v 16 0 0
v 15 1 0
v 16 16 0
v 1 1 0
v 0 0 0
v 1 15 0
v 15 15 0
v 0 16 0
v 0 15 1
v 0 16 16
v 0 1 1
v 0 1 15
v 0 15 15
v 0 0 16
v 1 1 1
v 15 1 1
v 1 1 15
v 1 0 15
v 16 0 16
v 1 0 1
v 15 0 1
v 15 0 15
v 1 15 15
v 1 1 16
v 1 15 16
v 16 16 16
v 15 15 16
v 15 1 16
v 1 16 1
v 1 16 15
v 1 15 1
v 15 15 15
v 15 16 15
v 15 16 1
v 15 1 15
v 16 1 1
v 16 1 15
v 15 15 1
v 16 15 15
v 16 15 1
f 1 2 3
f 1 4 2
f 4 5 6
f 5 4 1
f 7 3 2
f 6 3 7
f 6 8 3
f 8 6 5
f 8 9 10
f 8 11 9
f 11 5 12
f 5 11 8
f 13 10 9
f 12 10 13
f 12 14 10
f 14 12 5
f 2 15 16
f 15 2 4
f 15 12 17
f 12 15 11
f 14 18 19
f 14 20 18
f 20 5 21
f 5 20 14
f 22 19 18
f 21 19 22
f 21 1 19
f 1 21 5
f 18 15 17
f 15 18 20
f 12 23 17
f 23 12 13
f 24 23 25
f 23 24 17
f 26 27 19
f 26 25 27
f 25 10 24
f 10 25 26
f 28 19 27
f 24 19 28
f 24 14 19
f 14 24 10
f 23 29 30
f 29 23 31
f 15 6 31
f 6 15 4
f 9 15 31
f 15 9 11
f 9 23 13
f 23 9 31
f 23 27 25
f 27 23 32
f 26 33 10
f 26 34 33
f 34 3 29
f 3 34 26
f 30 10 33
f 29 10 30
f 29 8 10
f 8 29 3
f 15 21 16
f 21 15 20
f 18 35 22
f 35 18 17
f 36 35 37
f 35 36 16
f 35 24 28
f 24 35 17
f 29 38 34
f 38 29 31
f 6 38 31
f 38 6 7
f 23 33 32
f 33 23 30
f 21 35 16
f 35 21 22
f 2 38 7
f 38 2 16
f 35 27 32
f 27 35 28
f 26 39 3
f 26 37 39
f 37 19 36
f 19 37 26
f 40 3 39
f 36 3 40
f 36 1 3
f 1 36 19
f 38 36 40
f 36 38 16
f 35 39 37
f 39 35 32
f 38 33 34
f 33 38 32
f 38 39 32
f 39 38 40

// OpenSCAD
union() {
    translate([0.0, 0.0, 0.0]) cube([1, 1, 1]);
    translate([0.0, 0.0, 1.0]) cube([1, 1, 1]);
    translate([0.0, 0.0, 2.0]) cube([1, 1, 1]);
    translate([0.0, 0.0, 3.0]) cube([1, 1, 1]);
    translate([0.0, 0.0, 4.0]) cube([1, 1, 1]);
    translate([0.0, 0.0, 5.0]) cube([1, 1, 1]);
    translate([0.0, 0.0, 6.0]) cube([1, 1, 1]);
    translate([0.0, 0.0, 7.0]) cube([1, 1, 1]);
    translate([0.0, 0.0, 8.0]) cube([1, 1, 1]);
    translate([0.0, 0.0, 9.0]) cube([1, 1, 1]);
    translate([0.0, 0.0, 10.0]) cube([1, 1, 1]);
    translate([0.0, 0.0, 11.0]) cube([1, 1, 1]);
    translate([0.0, 0.0, 12.0]) cube([1, 1, 1]);
    translate([0.0, 0.0, 13.0]) cube([1, 1, 1]);
    translate([0.0, 0.0, 14.0]) cube([1, 1, 1]);
    translate([0.0, 0.0, 15.0]) cube([1, 1, 1]);
    translate([0.0, 1.0, 0.0]) cube([1, 1, 1]);
    translate([0.0, 1.0, 15.0]) cube([1, 1, 1]);
    translate([0.0, 2.0, 0.0]) cube([1, 1, 1]);
    translate([0.0, 2.0, 15.0]) cube([1, 1, 1]);
    translate([0.0, 3.0, 0.0]) cube([1, 1, 1]);
    translate([0.0, 3.0, 15.0]) cube([1, 1, 1]);
    translate([0.0, 4.0, 0.0]) cube([1, 1, 1]);
    translate([0.0, 4.0, 15.0]) cube([1, 1, 1]);
    translate([0.0, 5.0, 0.0]) cube([1, 1, 1]);
    translate([0.0, 5.0, 15.0]) cube([1, 1, 1]);
    translate([0.0, 6.0, 0.0]) cube([1, 1, 1]);
    translate([0.0, 6.0, 15.0]) cube([1, 1, 1]);
    translate([0.0, 7.0, 0.0]) cube([1, 1, 1]);
    translate([0.0, 7.0, 15.0]) cube([1, 1, 1]);
    translate([0.0, 8.0, 0.0]) cube([1, 1, 1]);
    translate([0.0, 8.0, 15.0]) cube([1, 1, 1]);
    translate([0.0, 9.0, 0.0]) cube([1, 1, 1]);
    translate([0.0, 9.0, 15.0]) cube([1, 1, 1]);
    translate([0.0, 10.0, 0.0]) cube([1, 1, 1]);
    translate([0.0, 10.0, 15.0]) cube([1, 1, 1]);
    translate([0.0, 11.0, 0.0]) cube([1, 1, 1]);
    translate([0.0, 11.0, 15.0]) cube([1, 1, 1]);
    translate([0.0, 12.0, 0.0]) cube([1, 1, 1]);
    translate([0.0, 12.0, 15.0]) cube([1, 1, 1]);
    translate([0.0, 13.0, 0.0]) cube([1, 1, 1]);
    translate([0.0, 13.0, 15.0]) cube([1, 1, 1]);
    translate([0.0, 14.0, 0.0]) cube([1, 1, 1]);
    translate([0.0, 14.0, 15.0]) cube([1, 1, 1]);
    translate([0.0, 15.0, 0.0]) cube([1, 1, 1]);
    translate([0.0, 15.0, 1.0]) cube([1, 1, 1]);
    translate([0.0, 15.0, 2.0]) cube([1, 1, 1]);
    translate([0.0, 15.0, 3.0]) cube([1, 1, 1]);
    translate([0.0, 15.0, 4.0]) cube([1, 1, 1]);
    translate([0.0, 15.0, 5.0]) cube([1, 1, 1]);
    translate([0.0, 15.0, 6.0]) cube([1, 1, 1]);
    translate([0.0, 15.0, 7.0]) cube([1, 1, 1]);
    translate([0.0, 15.0, 8.0]) cube([1, 1, 1]);
    translate([0.0, 15.0, 9.0]) cube([1, 1, 1]);
    translate([0.0, 15.0, 10.0]) cube([1, 1, 1]);
    translate([0.0, 15.0, 11.0]) cube([1, 1, 1]);
    translate([0.0, 15.0, 12.0]) cube([1, 1, 1]);
    translate([0.0, 15.0, 13.0]) cube([1, 1, 1]);
    translate([0.0, 15.0, 14.0]) cube([1, 1, 1]);
    translate([0.0, 15.0, 15.0]) cube([1, 1, 1]);
    translate([1.0, 0.0, 0.0]) cube([1, 1, 1]);
    translate([1.0, 0.0, 15.0]) cube([1, 1, 1]);
    translate([1.0, 15.0, 0.0]) cube([1, 1, 1]);
    translate([1.0, 15.0, 15.0]) cube([1, 1, 1]);
    translate([2.0, 0.0, 0.0]) cube([1, 1, 1]);
    translate([2.0, 0.0, 15.0]) cube([1, 1, 1]);
    translate([2.0, 15.0, 0.0]) cube([1, 1, 1]);
    translate([2.0, 15.0, 15.0]) cube([1, 1, 1]);
    translate([3.0, 0.0, 0.0]) cube([1, 1, 1]);
    translate([3.0, 0.0, 15.0]) cube([1, 1, 1]);
    translate([3.0, 15.0, 0.0]) cube([1, 1, 1]);
    translate([3.0, 15.0, 15.0]) cube([1, 1, 1]);
    translate([4.0, 0.0, 0.0]) cube([1, 1, 1]);
    translate([4.0, 0.0, 15.0]) cube([1, 1, 1]);
    translate([4.0, 15.0, 0.0]) cube([1, 1, 1]);
    translate([4.0, 15.0, 15.0]) cube([1, 1, 1]);
    translate([5.0, 0.0, 0.0]) cube([1, 1, 1]);
    translate([5.0, 0.0, 15.0]) cube([1, 1, 1]);
    translate([5.0, 15.0, 0.0]) cube([1, 1, 1]);
    translate([5.0, 15.0, 15.0]) cube([1, 1, 1]);
    translate([6.0, 0.0, 0.0]) cube([1, 1, 1]);
    translate([6.0, 0.0, 15.0]) cube([1, 1, 1]);
    translate([6.0, 15.0, 0.0]) cube([1, 1, 1]);
    translate([6.0, 15.0, 15.0]) cube([1, 1, 1]);
    translate([7.0, 0.0, 0.0]) cube([1, 1, 1]);
    translate([7.0, 0.0, 15.0]) cube([1, 1, 1]);
    translate([7.0, 15.0, 0.0]) cube([1, 1, 1]);
    translate([7.0, 15.0, 15.0]) cube([1, 1, 1]);
    translate([8.0, 0.0, 0.0]) cube([1, 1, 1]);
    translate([8.0, 0.0, 15.0]) cube([1, 1, 1]);
    translate([8.0, 15.0, 0.0]) cube([1, 1, 1]);
    translate([8.0, 15.0, 15.0]) cube([1, 1, 1]);
    translate([9.0, 0.0, 0.0]) cube([1, 1, 1]);
    translate([9.0, 0.0, 15.0]) cube([1, 1, 1]);
    translate([9.0, 15.0, 0.0]) cube([1, 1, 1]);
    translate([9.0, 15.0, 15.0]) cube([1, 1, 1]);
    translate([10.0, 0.0, 0.0]) cube([1, 1, 1]);
    translate([10.0, 0.0, 15.0]) cube([1, 1, 1]);
    translate([10.0, 15.0, 0.0]) cube([1, 1, 1]);
    translate([10.0, 15.0, 15.0]) cube([1, 1, 1]);
    translate([11.0, 0.0, 0.0]) cube([1, 1, 1]);
    translate([11.0, 0.0, 15.0]) cube([1, 1, 1]);
    translate([11.0, 15.0, 0.0]) cube([1, 1, 1]);
    translate([11.0, 15.0, 15.0]) cube([1, 1, 1]);
    translate([12.0, 0.0, 0.0]) cube([1, 1, 1]);
    translate([12.0, 0.0, 15.0]) cube([1, 1, 1]);
    translate([12.0, 15.0, 0.0]) cube([1, 1, 1]);
    translate([12.0, 15.0, 15.0]) cube([1, 1, 1]);
    translate([13.0, 0.0, 0.0]) cube([1, 1, 1]);
    translate([13.0, 0.0, 15.0]) cube([1, 1, 1]);
    translate([13.0, 15.0, 0.0]) cube([1, 1, 1]);
    translate([13.0, 15.0, 15.0]) cube([1, 1, 1]);
    translate([14.0, 0.0, 0.0]) cube([1, 1, 1]);
    translate([14.0, 0.0, 15.0]) cube([1, 1, 1]);
    translate([14.0, 15.0, 0.0]) cube([1, 1, 1]);
    translate([14.0, 15.0, 15.0]) cube([1, 1, 1]);
    translate([15.0, 0.0, 0.0]) cube([1, 1, 1]);
    translate([15.0, 0.0, 1.0]) cube([1, 1, 1]);
    translate([15.0, 0.0, 2.0]) cube([1, 1, 1]);
    translate([15.0, 0.0, 3.0]) cube([1, 1, 1]);
    translate([15.0, 0.0, 4.0]) cube([1, 1, 1]);
    translate([15.0, 0.0, 5.0]) cube([1, 1, 1]);
    translate([15.0, 0.0, 6.0]) cube([1, 1, 1]);
    translate([15.0, 0.0, 7.0]) cube([1, 1, 1]);
    translate([15.0, 0.0, 8.0]) cube([1, 1, 1]);
    translate([15.0, 0.0, 9.0]) cube([1, 1, 1]);
    translate([15.0, 0.0, 10.0]) cube([1, 1, 1]);
    translate([15.0, 0.0, 11.0]) cube([1, 1, 1]);
    translate([15.0, 0.0, 12.0]) cube([1, 1, 1]);
    translate([15.0, 0.0, 13.0]) cube([1, 1, 1]);
    translate([15.0, 0.0, 14.0]) cube([1, 1, 1]);
    translate([15.0, 0.0, 15.0]) cube([1, 1, 1]);
    translate([15.0, 1.0, 0.0]) cube([1, 1, 1]);
    translate([15.0, 1.0, 15.0]) cube([1, 1, 1]);
    translate([15.0, 2.0, 0.0]) cube([1, 1, 1]);
    translate([15.0, 2.0, 15.0]) cube([1, 1, 1]);
    translate([15.0, 3.0, 0.0]) cube([1, 1, 1]);
    translate([15.0, 3.0, 15.0]) cube([1, 1, 1]);
    translate([15.0, 4.0, 0.0]) cube([1, 1, 1]);
    translate([15.0, 4.0, 15.0]) cube([1, 1, 1]);
    translate([15.0, 5.0, 0.0]) cube([1, 1, 1]);
    translate([15.0, 5.0, 15.0]) cube([1, 1, 1]);
    translate([15.0, 6.0, 0.0]) cube([1, 1, 1]);
    translate([15.0, 6.0, 15.0]) cube([1, 1, 1]);
    translate([15.0, 7.0, 0.0]) cube([1, 1, 1]);
    translate([15.0, 7.0, 15.0]) cube([1, 1, 1]);
    translate([15.0, 8.0, 0.0]) cube([1, 1, 1]);
    translate([15.0, 8.0, 15.0]) cube([1, 1, 1]);
    translate([15.0, 9.0, 0.0]) cube([1, 1, 1]);
    translate([15.0, 9.0, 15.0]) cube([1, 1, 1]);
    translate([15.0, 10.0, 0.0]) cube([1, 1, 1]);
    translate([15.0, 10.0, 15.0]) cube([1, 1, 1]);
    translate([15.0, 11.0, 0.0]) cube([1, 1, 1]);
    translate([15.0, 11.0, 15.0]) cube([1, 1, 1]);
    translate([15.0, 12.0, 0.0]) cube([1, 1, 1]);
    translate([15.0, 12.0, 15.0]) cube([1, 1, 1]);
    translate([15.0, 13.0, 0.0]) cube([1, 1, 1]);
    translate([15.0, 13.0, 15.0]) cube([1, 1, 1]);
    translate([15.0, 14.0, 0.0]) cube([1, 1, 1]);
    translate([15.0, 14.0, 15.0]) cube([1, 1, 1]);
    translate([15.0, 15.0, 0.0]) cube([1, 1, 1]);
    translate([15.0, 15.0, 1.0]) cube([1, 1, 1]);
    translate([15.0, 15.0, 2.0]) cube([1, 1, 1]);
    translate([15.0, 15.0, 3.0]) cube([1, 1, 1]);
    translate([15.0, 15.0, 4.0]) cube([1, 1, 1]);
    translate([15.0, 15.0, 5.0]) cube([1, 1, 1]);
    translate([15.0, 15.0, 6.0]) cube([1, 1, 1]);
    translate([15.0, 15.0, 7.0]) cube([1, 1, 1]);
    translate([15.0, 15.0, 8.0]) cube([1, 1, 1]);
    translate([15.0, 15.0, 9.0]) cube([1, 1, 1]);
    translate([15.0, 15.0, 10.0]) cube([1, 1, 1]);
    translate([15.0, 15.0, 11.0]) cube([1, 1, 1]);
    translate([15.0, 15.0, 12.0]) cube([1, 1, 1]);
    translate([15.0, 15.0, 13.0]) cube([1, 1, 1]);
    translate([15.0, 15.0, 14.0]) cube([1, 1, 1]);
    translate([15.0, 15.0, 15.0]) cube([1, 1, 1]);
}
